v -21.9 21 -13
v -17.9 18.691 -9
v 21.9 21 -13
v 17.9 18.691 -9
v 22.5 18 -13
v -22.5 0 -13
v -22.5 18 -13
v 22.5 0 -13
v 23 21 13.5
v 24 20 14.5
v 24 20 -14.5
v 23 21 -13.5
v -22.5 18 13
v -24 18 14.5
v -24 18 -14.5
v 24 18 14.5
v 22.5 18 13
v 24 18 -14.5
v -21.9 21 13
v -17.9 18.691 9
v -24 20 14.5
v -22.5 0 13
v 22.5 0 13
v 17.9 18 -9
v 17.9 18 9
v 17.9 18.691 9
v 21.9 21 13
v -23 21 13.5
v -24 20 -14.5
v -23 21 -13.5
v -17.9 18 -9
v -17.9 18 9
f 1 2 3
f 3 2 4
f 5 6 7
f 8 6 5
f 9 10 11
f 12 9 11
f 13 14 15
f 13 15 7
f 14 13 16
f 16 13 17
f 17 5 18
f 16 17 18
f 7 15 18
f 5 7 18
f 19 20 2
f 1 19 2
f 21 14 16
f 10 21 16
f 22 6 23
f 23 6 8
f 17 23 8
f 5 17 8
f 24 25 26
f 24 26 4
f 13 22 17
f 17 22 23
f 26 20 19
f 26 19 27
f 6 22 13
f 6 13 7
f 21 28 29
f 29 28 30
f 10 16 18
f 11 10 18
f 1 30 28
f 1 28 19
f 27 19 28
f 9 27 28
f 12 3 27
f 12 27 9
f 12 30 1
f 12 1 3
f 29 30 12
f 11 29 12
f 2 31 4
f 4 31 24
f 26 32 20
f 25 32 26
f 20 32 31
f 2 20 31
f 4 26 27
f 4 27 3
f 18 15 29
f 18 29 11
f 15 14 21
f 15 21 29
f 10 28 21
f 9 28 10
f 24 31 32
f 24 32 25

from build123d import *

# Parameters (mm, degrees)
SKETCH1_W           = 45
SKETCH1_H           = 26
BOSS_EXTRUDE1_DEPTH = 18
SKETCH2_W           = 48
SKETCH2_H           = 29
SKETCH2_W_2         = 35.8
SKETCH2_H_2         = 18
BOSS_EXTRUDE2_DEPTH = 3
CHAMFER1_SIZE       = 1
CHAMFER2_SIZE       = 4
CHAMFER2_SIZE2      = 2.309401077


with BuildPart() as part:
    # Sketch1 → Boss-Extrude1 (new body)
    with BuildSketch(Plane(origin=(0, 0, 0), x_dir=(1, 0, 0), z_dir=(0, 1, 0))):
        Rectangle(SKETCH1_W, SKETCH1_H)
    extrude(amount=BOSS_EXTRUDE1_DEPTH)

    # Sketch2 → Boss-Extrude2 (add)
    with BuildSketch(Plane(origin=(0, 18, 0), x_dir=(1, 0, 0), z_dir=(0, 1, 0))):
        Rectangle(SKETCH2_W, SKETCH2_H)
        Rectangle(SKETCH2_W_2, SKETCH2_H_2, mode=Mode.SUBTRACT)
    extrude(amount=BOSS_EXTRUDE2_DEPTH)

    # Chamfer1
    chamfer1_edges = [part.edges().sort_by_distance(p)[0] for p in [
        (24, 21, 0),
        (0, 21, -14.5),
        (-24, 21, 0),
        (0, 21, 14.5),
    ]]
    chamfer(chamfer1_edges, length=CHAMFER1_SIZE)

    # Chamfer2
    chamfer2_edges = [part.edges().sort_by_distance(p)[0] for p in [
        (17.9, 21, 0),
        (0, 21, -9),
        (-17.9, 21, 0),
        (0, 21, 9),
    ]]
    chamfer2_side = [part.faces().sort_by_distance(p)[0] for p in [
        (22.466614586, 21, 0),
    ]]
    chamfer(chamfer2_edges, length=CHAMFER2_SIZE, length2=CHAMFER2_SIZE2, reference=chamfer2_side[0])


solid = part.part
